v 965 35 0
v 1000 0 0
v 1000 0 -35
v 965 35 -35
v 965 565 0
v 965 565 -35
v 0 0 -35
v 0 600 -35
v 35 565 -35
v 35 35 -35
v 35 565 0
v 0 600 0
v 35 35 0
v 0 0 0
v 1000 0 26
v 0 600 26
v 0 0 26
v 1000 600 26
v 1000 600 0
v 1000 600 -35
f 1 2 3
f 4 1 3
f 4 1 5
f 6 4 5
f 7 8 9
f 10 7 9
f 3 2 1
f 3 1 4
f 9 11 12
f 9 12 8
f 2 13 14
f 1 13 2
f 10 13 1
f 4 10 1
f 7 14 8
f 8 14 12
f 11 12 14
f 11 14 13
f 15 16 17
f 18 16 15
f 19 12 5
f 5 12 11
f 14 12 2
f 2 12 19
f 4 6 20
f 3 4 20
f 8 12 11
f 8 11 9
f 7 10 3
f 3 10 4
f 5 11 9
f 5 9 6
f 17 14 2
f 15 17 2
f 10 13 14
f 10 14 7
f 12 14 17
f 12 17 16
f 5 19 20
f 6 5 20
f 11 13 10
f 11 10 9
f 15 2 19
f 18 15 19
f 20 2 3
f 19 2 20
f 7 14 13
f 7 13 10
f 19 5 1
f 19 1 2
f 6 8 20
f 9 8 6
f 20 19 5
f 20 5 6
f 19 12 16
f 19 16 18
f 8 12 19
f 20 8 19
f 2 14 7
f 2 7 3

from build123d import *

# Parameters (mm, degrees)
F3_W       = 1000
F3_H       = 35
F7_DEPTH   = 35
F6_W       = 1000
F6_H       = 35
F8_DEPTH   = 35
F4_W       = 35
F4_H       = 600
F9_DEPTH   = 35
F5_W       = 35
F5_H       = 600
F10_DEPTH  = 35
F11_SIZE   = 34.99999
F12_SIZE   = 34.99999
F13_SIZE   = 34.99999
F14_SIZE   = 34.99999
F15_SIZE   = 34.99999
F15_2_SIZE = 34.99999
F16_SIZE   = 34.99999
F16_2_SIZE = 34.99999
F2_W       = 1000
F2_H       = 600
F17_DEPTH  = 26


# Not quite as in the source:
# - a fillet or chamfer is up to 0.001 mm smaller than in the source, because OpenCascade refuses the exact size


with BuildPart() as f7:
    # F3 (on Top) → F7 (new body)
    with BuildSketch(Plane.XY):
        with Locations((500, 17.5)):
            Rectangle(F3_W, F3_H)
    extrude(amount=-F7_DEPTH)

    # F14 (size 35 in the source; OpenCascade refuses exactly that, so slightly less here)
    f14_edges = [f7.edges().sort_by_distance(p)[0] for p in [
        (1000, 35, -17.5),
    ]]
    chamfer(f14_edges, length=F14_SIZE)

    # F15 (size 35 in the source; OpenCascade refuses exactly that, so slightly less here)
    f15_edges = [f7.edges().sort_by_distance(p)[0] for p in [
        (0, 35, -17.5),
    ]]
    chamfer(f15_edges, length=F15_SIZE)


with BuildPart() as f8:
    # F6 (on Top) → F8 (new body)
    with BuildSketch(Plane.XY):
        with Locations((500, 582.5)):
            Rectangle(F6_W, F6_H)
    extrude(amount=-F8_DEPTH)

    # F12 (size 35 in the source; OpenCascade refuses exactly that, so slightly less here)
    f12_edges = [f8.edges().sort_by_distance(p)[0] for p in [
        (1000, 565, -17.5),
    ]]
    chamfer(f12_edges, length=F12_SIZE)

    # F16#2 (size 35 in the source; OpenCascade refuses exactly that, so slightly less here)
    f16_2_edges = [f8.edges().sort_by_distance(p)[0] for p in [
        (0, 565, -17.5),
    ]]
    chamfer(f16_2_edges, length=F16_2_SIZE)


with BuildPart() as f9:
    # F4 (on Top) → F9 (new body)
    with BuildSketch(Plane.XY):
        with Locations((17.5, 300)):
            Rectangle(F4_W, F4_H)
    extrude(amount=-F9_DEPTH)

    # F15#2 (size 35 in the source; OpenCascade refuses exactly that, so slightly less here)
    f15_2_edges = [f9.edges().sort_by_distance(p)[0] for p in [
        (35, 0, -17.5),
    ]]
    chamfer(f15_2_edges, length=F15_2_SIZE)

    # F16 (size 35 in the source; OpenCascade refuses exactly that, so slightly less here)
    f16_edges = [f9.edges().sort_by_distance(p)[0] for p in [
        (35, 600, -17.5),
    ]]
    chamfer(f16_edges, length=F16_SIZE)


with BuildPart() as f10:
    # F5 (on Top) → F10 (new body)
    with BuildSketch(Plane.XY):
        with Locations((982.5, 300)):
            Rectangle(F5_W, F5_H)
    extrude(amount=-F10_DEPTH)

    # F11 (size 35 in the source; OpenCascade refuses exactly that, so slightly less here)
    f11_edges = [f10.edges().sort_by_distance(p)[0] for p in [
        (965, 600, -17.5),
    ]]
    chamfer(f11_edges, length=F11_SIZE)

    # F13 (size 35 in the source; OpenCascade refuses exactly that, so slightly less here)
    f13_edges = [f10.edges().sort_by_distance(p)[0] for p in [
        (965, 0, -17.5),
    ]]
    chamfer(f13_edges, length=F13_SIZE)


with BuildPart() as f17:
    # F2 (on Top) → F17 (new body)
    with BuildSketch(Plane.XY):
        with Locations((500, 300)):
            Rectangle(F2_W, F2_H)
    extrude(amount=F17_DEPTH)


solid = Compound([f7.part, f8.part, f9.part, f10.part, f17.part])
